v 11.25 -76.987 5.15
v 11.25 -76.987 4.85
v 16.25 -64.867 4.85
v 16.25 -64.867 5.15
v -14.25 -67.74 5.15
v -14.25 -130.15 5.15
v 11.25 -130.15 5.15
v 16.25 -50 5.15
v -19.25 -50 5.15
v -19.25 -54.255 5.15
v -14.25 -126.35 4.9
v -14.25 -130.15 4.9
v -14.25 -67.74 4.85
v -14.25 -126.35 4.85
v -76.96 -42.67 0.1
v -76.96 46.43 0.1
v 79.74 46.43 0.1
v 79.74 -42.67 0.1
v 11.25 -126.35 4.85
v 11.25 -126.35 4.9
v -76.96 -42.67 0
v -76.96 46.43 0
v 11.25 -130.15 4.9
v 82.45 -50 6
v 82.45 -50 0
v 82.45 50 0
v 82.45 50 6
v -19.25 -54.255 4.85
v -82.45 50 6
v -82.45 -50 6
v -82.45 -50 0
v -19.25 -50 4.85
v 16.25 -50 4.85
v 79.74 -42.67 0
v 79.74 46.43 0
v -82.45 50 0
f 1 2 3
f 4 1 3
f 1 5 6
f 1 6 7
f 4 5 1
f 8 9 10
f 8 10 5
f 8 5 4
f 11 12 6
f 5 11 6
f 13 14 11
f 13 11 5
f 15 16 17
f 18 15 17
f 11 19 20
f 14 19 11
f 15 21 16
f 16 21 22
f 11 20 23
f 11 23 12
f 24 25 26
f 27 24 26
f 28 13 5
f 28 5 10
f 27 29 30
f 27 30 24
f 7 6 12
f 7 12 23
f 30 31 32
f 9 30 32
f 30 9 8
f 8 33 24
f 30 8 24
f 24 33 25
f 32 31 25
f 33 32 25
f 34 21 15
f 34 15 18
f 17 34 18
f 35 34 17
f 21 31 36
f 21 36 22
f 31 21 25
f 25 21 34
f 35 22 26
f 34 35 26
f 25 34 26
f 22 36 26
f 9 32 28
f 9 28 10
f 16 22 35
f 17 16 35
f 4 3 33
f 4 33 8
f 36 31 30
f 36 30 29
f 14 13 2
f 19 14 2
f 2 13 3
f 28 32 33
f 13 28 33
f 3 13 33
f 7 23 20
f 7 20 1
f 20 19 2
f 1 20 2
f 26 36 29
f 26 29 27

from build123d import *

# Parameters (mm, degrees)
SKETCH_1_W            = 164.9
SKETCH_1_H            = 100
EXTRUDE_319_DEPTH     = 6
SKETCH_2_W            = 156.7
SKETCH_2_H            = 89.1
CUT_EXTRUDE_496_DEPTH = 0.1
SKETCH_4_W            = 35.5
SKETCH_4_H            = 0.3
EXTRUDE_2_DEPTH       = 80.15
CUT_EXTRUDE_4_DEPTH   = 155.144566884
SKETCH_6_W            = 25.5
SKETCH_6_H            = 3.8
CUT_EXTRUDE_5_DEPTH   = 0.05


with BuildPart() as part:
    # 草图1 → Extrude 319 (new body)
    with BuildSketch(Plane.XY):
        Rectangle(SKETCH_1_W, SKETCH_1_H)
    extrude(amount=EXTRUDE_319_DEPTH)

    # 草图2 → Cut-Extrude 496 (cut)
    with BuildSketch(Plane.XY):
        with Locations((1.39, 1.88)):
            Rectangle(SKETCH_2_W, SKETCH_2_H)
    extrude(amount=CUT_EXTRUDE_496_DEPTH, mode=Mode.SUBTRACT)

    # 草图4 → 凸台-拉伸2 (add)
    with BuildSketch(Plane.XZ.offset(50)):
        with Locations((-1.5, 5)):
            Rectangle(SKETCH_4_W, SKETCH_4_H)
    extrude(amount=EXTRUDE_2_DEPTH)

    # 草图5 → 切除-拉伸4 (cut, through all)
    with BuildSketch(Plane(origin=(0, 0, 4.85), x_dir=(-1, 0, 0), z_dir=(0, 0, -1))):
        Polygon((-16.25, -130.15), (-11.25, -130.15), (-11.25, -76.987179315), (-16.25, -64.867086026), align=None)
        Polygon((19.25, -130.15), (14.25, -130.15), (14.25, -67.739612604), (19.25, -54.255364134), align=None)
    extrude(amount=-CUT_EXTRUDE_4_DEPTH, mode=Mode.SUBTRACT)

    # 草图6 → 切除-拉伸5 (cut)
    with BuildSketch(Plane(origin=(0, 0, 4.85), x_dir=(-1, 0, 0), z_dir=(0, 0, -1))):
        with Locations((1.5, -128.25)):
            Rectangle(SKETCH_6_W, SKETCH_6_H)
    extrude(amount=-CUT_EXTRUDE_5_DEPTH, mode=Mode.SUBTRACT)


solid = part.part
